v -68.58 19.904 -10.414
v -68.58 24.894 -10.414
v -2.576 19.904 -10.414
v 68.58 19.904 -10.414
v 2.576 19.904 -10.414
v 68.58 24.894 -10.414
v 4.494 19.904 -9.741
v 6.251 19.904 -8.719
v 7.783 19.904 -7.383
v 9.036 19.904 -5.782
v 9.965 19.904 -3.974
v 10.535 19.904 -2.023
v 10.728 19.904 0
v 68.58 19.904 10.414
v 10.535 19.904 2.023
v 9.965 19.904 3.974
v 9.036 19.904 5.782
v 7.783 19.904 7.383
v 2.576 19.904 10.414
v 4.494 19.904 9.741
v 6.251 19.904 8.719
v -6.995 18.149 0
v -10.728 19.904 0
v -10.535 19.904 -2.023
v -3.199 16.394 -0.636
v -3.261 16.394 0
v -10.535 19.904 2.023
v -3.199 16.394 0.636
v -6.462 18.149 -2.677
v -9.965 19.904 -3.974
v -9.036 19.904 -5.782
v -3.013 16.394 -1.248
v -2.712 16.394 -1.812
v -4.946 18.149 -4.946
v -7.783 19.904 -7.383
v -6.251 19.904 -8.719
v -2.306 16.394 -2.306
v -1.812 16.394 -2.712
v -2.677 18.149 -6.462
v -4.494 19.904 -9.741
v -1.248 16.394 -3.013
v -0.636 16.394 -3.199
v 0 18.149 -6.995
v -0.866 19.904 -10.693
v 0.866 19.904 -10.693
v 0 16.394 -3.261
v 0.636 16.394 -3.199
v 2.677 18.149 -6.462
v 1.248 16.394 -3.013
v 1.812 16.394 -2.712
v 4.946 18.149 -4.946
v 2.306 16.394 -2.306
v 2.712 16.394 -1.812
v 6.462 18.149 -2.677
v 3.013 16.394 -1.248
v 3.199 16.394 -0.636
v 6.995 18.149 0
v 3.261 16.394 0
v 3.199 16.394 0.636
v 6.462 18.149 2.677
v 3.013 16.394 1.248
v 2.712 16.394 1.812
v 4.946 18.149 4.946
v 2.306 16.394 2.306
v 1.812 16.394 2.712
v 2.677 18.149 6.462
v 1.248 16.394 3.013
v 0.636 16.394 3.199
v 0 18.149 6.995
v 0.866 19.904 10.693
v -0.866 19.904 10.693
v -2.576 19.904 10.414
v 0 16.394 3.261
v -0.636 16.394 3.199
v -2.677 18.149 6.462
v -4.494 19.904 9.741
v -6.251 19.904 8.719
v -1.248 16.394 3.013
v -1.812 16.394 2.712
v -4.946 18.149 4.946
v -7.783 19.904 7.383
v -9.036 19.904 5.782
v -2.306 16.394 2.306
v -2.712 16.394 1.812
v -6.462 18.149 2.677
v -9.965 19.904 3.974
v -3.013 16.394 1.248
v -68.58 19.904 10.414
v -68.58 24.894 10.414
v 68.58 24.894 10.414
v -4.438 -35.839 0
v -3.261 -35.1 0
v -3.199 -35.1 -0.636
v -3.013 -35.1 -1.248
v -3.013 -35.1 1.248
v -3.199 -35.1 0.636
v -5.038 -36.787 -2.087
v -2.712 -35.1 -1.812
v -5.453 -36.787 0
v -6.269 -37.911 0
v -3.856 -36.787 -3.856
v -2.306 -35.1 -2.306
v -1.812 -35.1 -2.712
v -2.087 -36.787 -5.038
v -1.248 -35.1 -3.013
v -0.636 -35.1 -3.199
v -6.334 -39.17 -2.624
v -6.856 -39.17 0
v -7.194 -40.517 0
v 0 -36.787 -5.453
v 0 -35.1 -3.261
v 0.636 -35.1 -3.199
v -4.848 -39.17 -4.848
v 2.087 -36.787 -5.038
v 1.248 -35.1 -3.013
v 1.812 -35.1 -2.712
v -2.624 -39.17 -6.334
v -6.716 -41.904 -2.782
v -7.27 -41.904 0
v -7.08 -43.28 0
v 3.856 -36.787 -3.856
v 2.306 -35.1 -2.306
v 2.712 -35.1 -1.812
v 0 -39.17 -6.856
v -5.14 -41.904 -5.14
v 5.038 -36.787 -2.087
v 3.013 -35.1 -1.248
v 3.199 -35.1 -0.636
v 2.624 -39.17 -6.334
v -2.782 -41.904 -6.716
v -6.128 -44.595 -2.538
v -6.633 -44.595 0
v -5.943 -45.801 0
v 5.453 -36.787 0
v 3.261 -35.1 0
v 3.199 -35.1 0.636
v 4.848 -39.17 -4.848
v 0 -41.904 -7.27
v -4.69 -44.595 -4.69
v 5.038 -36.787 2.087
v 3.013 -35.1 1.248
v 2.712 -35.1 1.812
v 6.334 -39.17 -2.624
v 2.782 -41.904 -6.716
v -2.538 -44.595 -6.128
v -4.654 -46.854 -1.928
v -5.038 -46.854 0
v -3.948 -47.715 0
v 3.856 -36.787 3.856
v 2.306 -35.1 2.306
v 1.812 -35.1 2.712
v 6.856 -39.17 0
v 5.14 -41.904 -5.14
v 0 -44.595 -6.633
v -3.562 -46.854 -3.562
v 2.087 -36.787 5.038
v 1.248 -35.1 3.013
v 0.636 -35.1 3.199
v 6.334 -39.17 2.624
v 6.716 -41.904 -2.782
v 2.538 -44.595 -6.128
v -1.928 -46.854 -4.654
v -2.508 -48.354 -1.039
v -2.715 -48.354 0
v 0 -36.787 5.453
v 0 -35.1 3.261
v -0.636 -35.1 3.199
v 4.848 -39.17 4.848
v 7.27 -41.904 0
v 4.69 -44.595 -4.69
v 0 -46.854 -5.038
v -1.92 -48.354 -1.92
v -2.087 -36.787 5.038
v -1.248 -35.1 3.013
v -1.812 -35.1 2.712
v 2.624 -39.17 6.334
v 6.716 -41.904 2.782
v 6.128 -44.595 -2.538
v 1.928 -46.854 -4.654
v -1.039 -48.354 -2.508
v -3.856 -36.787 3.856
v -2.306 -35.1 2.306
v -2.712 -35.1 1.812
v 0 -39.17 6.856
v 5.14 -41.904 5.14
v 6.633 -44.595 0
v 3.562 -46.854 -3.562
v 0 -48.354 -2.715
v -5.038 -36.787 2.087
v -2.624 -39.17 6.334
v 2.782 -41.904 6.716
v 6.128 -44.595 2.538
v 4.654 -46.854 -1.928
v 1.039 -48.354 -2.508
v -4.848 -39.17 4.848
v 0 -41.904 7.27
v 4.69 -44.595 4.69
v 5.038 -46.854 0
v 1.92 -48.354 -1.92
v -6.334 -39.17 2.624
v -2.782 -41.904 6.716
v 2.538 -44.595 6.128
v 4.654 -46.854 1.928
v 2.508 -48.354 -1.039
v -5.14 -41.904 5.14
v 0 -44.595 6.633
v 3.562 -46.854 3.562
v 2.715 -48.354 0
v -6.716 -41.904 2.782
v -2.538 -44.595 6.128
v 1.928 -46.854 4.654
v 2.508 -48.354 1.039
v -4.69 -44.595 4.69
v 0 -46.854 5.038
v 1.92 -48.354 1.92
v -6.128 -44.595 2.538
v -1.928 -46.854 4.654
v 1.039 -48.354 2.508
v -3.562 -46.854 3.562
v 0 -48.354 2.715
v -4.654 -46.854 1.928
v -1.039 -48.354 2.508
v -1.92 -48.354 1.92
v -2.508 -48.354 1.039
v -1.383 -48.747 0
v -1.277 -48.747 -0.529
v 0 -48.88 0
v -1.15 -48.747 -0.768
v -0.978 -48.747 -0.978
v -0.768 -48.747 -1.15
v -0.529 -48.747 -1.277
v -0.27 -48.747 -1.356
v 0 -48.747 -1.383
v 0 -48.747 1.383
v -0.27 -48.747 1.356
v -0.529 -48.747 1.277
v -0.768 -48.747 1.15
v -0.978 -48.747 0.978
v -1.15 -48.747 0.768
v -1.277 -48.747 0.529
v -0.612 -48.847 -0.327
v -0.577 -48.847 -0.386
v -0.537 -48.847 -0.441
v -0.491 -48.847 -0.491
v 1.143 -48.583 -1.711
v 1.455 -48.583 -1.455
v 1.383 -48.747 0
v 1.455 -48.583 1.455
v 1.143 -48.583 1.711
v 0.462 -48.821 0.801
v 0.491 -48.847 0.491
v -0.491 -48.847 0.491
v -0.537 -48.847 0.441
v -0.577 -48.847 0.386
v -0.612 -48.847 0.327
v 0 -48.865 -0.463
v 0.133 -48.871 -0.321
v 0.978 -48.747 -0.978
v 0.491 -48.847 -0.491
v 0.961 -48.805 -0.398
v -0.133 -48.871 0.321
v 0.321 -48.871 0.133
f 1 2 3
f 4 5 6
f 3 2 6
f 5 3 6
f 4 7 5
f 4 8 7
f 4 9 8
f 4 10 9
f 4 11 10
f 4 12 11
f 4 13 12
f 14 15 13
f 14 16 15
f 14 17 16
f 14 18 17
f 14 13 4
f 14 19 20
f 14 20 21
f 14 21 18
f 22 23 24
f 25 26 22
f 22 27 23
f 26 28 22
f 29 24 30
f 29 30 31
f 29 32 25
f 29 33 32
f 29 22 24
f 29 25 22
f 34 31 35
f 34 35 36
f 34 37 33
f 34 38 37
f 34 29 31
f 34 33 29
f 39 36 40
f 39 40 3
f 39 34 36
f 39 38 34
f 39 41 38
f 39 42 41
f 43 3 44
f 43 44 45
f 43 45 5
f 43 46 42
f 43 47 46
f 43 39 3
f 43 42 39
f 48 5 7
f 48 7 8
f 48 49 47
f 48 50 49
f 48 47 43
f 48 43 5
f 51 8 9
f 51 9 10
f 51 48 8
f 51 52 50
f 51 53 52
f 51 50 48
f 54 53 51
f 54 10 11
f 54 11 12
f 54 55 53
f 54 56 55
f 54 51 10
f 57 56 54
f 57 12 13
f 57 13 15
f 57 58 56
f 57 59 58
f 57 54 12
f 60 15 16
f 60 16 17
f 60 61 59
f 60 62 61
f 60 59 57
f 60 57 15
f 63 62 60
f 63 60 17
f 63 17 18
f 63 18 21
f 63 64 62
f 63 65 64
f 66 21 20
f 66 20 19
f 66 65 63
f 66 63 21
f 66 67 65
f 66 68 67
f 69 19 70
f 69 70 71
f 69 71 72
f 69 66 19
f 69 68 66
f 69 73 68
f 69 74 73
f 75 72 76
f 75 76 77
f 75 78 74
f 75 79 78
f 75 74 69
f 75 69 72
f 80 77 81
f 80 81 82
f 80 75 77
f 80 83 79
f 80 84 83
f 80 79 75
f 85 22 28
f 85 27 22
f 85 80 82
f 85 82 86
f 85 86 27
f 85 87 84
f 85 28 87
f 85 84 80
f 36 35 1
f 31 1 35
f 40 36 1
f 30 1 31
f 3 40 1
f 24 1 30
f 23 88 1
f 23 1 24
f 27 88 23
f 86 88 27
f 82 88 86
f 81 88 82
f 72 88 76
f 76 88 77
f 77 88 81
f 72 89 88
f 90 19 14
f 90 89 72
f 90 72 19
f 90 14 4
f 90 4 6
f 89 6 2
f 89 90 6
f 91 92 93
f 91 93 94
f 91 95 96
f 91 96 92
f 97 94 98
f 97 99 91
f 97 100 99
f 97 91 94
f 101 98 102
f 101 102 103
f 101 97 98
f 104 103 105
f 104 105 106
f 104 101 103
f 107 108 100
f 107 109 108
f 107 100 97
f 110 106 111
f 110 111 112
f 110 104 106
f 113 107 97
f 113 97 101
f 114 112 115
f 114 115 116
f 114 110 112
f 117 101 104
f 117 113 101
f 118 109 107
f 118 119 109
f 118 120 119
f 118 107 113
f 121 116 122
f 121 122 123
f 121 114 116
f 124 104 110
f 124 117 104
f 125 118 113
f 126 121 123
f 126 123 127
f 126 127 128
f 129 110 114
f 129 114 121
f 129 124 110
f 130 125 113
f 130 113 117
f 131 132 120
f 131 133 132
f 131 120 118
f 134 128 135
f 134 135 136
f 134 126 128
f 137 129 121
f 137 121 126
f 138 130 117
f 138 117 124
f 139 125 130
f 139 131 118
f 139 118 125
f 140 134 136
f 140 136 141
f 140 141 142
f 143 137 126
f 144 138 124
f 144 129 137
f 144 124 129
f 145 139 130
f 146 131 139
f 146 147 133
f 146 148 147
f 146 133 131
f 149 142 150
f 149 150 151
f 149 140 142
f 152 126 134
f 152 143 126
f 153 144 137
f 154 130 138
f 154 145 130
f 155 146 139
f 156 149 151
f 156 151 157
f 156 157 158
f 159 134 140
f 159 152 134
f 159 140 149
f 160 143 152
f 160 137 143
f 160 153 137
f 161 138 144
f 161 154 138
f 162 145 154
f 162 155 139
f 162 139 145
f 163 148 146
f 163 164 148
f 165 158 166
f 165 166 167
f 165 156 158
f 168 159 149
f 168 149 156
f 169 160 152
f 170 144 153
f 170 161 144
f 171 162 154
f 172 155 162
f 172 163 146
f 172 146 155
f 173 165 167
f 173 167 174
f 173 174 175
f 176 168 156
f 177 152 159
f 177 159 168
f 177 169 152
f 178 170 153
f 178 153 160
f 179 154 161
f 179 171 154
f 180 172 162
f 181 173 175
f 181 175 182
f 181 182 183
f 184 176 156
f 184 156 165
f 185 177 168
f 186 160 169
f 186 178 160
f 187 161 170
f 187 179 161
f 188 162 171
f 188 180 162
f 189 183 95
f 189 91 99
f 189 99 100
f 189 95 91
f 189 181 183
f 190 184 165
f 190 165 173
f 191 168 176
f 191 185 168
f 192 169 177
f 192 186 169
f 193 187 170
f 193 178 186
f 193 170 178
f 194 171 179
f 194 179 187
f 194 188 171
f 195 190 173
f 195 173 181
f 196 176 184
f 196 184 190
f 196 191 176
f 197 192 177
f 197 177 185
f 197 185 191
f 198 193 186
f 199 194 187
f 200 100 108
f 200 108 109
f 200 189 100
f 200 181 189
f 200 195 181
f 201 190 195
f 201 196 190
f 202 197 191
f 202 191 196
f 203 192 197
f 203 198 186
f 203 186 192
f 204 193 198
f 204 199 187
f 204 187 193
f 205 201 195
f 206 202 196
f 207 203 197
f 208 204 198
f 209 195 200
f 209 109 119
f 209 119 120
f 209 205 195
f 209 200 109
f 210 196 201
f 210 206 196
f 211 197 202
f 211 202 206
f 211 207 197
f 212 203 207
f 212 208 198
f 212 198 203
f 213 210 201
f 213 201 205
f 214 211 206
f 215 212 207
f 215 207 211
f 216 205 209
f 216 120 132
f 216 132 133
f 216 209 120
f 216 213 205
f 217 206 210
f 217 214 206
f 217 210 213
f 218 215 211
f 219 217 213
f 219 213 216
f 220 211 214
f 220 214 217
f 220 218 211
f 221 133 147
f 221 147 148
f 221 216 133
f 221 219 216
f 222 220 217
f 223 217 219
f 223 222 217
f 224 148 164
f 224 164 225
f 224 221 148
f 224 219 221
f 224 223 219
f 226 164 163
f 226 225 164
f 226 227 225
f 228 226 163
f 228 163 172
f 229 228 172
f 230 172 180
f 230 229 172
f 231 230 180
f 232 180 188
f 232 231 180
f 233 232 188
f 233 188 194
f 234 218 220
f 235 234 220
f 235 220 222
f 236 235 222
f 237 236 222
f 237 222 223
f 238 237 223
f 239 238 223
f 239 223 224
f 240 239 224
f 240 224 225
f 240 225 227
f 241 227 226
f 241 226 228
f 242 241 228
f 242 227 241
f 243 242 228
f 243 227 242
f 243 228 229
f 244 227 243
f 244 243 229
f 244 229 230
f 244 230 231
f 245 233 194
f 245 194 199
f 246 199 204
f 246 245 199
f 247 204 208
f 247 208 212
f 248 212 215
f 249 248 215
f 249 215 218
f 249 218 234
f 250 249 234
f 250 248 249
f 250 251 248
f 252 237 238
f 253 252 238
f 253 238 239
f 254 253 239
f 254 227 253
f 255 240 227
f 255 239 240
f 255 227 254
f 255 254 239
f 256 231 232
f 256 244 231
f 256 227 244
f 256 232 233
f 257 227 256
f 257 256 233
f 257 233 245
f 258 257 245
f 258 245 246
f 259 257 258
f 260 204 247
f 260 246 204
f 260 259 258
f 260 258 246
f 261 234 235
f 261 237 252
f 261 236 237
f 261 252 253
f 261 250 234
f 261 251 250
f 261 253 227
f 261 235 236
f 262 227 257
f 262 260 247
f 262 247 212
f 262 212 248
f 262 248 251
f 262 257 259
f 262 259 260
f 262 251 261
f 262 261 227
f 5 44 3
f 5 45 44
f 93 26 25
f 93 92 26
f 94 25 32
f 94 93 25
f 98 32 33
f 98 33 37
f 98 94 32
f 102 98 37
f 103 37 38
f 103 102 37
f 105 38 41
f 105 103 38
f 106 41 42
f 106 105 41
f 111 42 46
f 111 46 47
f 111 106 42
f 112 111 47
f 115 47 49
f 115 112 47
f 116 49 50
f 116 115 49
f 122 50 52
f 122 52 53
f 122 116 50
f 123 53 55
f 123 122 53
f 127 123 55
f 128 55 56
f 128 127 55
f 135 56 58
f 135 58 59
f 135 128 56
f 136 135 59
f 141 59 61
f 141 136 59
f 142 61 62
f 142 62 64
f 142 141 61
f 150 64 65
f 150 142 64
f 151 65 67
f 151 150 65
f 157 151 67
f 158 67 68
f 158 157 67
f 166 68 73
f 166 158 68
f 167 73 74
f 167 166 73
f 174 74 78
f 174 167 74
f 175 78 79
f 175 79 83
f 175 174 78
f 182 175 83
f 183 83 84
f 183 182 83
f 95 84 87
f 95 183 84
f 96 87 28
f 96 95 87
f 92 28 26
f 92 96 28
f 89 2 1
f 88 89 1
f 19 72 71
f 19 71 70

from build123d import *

# Parameters (mm, degrees)
F0_W     = 68.58
F0_H     = 4.990084
F2_DEPTH = 10.414


with BuildPart() as f1:
    # F0 (on Top) → F1 (revolve)
    with BuildSketch(Plane.XY):
        Polygon((-3.261477, 16.393739), (0, 16.393739), (0, 19.904292), (-10.727971, 19.904292), align=None)
        with BuildLine():
            ThreePointArc((-3.261477, -35.100376), (-1.675796, -34.524032), (0, -34.328411))
            Line((0, -34.328411), (0, 16.393739))
            Line((0, 16.393739), (-3.261477, 16.393739))
            Line((-3.261477, 16.393739), (-3.261477, -35.100376))
        make_face()
        with BuildLine():
            Line((0, -48.879802), (0, -34.328411))
            ThreePointArc((0, -34.328411), (-1.675796, -34.524032), (-3.261477, -35.100376))
            ThreePointArc((-3.261477, -35.100376), (-7.080074, -43.279902), (0, -48.879802))
        make_face()
    revolve(axis=Axis((0, -8.967336, 0), (0, -1, 0)))

    # F0 (on Top) → F2 (join, symmetric)
    with BuildSketch(Plane.XY):
        Polygon((-10.727971, 19.904292), (0, 19.904292), (0, 24.894376), (-68.58, 24.894376), (-68.58, 19.904292), align=None)
        with Locations((34.29, 22.399334)):
            Rectangle(F0_W, F0_H)
    extrude(amount=F2_DEPTH, both=True)


solid = f1.part
